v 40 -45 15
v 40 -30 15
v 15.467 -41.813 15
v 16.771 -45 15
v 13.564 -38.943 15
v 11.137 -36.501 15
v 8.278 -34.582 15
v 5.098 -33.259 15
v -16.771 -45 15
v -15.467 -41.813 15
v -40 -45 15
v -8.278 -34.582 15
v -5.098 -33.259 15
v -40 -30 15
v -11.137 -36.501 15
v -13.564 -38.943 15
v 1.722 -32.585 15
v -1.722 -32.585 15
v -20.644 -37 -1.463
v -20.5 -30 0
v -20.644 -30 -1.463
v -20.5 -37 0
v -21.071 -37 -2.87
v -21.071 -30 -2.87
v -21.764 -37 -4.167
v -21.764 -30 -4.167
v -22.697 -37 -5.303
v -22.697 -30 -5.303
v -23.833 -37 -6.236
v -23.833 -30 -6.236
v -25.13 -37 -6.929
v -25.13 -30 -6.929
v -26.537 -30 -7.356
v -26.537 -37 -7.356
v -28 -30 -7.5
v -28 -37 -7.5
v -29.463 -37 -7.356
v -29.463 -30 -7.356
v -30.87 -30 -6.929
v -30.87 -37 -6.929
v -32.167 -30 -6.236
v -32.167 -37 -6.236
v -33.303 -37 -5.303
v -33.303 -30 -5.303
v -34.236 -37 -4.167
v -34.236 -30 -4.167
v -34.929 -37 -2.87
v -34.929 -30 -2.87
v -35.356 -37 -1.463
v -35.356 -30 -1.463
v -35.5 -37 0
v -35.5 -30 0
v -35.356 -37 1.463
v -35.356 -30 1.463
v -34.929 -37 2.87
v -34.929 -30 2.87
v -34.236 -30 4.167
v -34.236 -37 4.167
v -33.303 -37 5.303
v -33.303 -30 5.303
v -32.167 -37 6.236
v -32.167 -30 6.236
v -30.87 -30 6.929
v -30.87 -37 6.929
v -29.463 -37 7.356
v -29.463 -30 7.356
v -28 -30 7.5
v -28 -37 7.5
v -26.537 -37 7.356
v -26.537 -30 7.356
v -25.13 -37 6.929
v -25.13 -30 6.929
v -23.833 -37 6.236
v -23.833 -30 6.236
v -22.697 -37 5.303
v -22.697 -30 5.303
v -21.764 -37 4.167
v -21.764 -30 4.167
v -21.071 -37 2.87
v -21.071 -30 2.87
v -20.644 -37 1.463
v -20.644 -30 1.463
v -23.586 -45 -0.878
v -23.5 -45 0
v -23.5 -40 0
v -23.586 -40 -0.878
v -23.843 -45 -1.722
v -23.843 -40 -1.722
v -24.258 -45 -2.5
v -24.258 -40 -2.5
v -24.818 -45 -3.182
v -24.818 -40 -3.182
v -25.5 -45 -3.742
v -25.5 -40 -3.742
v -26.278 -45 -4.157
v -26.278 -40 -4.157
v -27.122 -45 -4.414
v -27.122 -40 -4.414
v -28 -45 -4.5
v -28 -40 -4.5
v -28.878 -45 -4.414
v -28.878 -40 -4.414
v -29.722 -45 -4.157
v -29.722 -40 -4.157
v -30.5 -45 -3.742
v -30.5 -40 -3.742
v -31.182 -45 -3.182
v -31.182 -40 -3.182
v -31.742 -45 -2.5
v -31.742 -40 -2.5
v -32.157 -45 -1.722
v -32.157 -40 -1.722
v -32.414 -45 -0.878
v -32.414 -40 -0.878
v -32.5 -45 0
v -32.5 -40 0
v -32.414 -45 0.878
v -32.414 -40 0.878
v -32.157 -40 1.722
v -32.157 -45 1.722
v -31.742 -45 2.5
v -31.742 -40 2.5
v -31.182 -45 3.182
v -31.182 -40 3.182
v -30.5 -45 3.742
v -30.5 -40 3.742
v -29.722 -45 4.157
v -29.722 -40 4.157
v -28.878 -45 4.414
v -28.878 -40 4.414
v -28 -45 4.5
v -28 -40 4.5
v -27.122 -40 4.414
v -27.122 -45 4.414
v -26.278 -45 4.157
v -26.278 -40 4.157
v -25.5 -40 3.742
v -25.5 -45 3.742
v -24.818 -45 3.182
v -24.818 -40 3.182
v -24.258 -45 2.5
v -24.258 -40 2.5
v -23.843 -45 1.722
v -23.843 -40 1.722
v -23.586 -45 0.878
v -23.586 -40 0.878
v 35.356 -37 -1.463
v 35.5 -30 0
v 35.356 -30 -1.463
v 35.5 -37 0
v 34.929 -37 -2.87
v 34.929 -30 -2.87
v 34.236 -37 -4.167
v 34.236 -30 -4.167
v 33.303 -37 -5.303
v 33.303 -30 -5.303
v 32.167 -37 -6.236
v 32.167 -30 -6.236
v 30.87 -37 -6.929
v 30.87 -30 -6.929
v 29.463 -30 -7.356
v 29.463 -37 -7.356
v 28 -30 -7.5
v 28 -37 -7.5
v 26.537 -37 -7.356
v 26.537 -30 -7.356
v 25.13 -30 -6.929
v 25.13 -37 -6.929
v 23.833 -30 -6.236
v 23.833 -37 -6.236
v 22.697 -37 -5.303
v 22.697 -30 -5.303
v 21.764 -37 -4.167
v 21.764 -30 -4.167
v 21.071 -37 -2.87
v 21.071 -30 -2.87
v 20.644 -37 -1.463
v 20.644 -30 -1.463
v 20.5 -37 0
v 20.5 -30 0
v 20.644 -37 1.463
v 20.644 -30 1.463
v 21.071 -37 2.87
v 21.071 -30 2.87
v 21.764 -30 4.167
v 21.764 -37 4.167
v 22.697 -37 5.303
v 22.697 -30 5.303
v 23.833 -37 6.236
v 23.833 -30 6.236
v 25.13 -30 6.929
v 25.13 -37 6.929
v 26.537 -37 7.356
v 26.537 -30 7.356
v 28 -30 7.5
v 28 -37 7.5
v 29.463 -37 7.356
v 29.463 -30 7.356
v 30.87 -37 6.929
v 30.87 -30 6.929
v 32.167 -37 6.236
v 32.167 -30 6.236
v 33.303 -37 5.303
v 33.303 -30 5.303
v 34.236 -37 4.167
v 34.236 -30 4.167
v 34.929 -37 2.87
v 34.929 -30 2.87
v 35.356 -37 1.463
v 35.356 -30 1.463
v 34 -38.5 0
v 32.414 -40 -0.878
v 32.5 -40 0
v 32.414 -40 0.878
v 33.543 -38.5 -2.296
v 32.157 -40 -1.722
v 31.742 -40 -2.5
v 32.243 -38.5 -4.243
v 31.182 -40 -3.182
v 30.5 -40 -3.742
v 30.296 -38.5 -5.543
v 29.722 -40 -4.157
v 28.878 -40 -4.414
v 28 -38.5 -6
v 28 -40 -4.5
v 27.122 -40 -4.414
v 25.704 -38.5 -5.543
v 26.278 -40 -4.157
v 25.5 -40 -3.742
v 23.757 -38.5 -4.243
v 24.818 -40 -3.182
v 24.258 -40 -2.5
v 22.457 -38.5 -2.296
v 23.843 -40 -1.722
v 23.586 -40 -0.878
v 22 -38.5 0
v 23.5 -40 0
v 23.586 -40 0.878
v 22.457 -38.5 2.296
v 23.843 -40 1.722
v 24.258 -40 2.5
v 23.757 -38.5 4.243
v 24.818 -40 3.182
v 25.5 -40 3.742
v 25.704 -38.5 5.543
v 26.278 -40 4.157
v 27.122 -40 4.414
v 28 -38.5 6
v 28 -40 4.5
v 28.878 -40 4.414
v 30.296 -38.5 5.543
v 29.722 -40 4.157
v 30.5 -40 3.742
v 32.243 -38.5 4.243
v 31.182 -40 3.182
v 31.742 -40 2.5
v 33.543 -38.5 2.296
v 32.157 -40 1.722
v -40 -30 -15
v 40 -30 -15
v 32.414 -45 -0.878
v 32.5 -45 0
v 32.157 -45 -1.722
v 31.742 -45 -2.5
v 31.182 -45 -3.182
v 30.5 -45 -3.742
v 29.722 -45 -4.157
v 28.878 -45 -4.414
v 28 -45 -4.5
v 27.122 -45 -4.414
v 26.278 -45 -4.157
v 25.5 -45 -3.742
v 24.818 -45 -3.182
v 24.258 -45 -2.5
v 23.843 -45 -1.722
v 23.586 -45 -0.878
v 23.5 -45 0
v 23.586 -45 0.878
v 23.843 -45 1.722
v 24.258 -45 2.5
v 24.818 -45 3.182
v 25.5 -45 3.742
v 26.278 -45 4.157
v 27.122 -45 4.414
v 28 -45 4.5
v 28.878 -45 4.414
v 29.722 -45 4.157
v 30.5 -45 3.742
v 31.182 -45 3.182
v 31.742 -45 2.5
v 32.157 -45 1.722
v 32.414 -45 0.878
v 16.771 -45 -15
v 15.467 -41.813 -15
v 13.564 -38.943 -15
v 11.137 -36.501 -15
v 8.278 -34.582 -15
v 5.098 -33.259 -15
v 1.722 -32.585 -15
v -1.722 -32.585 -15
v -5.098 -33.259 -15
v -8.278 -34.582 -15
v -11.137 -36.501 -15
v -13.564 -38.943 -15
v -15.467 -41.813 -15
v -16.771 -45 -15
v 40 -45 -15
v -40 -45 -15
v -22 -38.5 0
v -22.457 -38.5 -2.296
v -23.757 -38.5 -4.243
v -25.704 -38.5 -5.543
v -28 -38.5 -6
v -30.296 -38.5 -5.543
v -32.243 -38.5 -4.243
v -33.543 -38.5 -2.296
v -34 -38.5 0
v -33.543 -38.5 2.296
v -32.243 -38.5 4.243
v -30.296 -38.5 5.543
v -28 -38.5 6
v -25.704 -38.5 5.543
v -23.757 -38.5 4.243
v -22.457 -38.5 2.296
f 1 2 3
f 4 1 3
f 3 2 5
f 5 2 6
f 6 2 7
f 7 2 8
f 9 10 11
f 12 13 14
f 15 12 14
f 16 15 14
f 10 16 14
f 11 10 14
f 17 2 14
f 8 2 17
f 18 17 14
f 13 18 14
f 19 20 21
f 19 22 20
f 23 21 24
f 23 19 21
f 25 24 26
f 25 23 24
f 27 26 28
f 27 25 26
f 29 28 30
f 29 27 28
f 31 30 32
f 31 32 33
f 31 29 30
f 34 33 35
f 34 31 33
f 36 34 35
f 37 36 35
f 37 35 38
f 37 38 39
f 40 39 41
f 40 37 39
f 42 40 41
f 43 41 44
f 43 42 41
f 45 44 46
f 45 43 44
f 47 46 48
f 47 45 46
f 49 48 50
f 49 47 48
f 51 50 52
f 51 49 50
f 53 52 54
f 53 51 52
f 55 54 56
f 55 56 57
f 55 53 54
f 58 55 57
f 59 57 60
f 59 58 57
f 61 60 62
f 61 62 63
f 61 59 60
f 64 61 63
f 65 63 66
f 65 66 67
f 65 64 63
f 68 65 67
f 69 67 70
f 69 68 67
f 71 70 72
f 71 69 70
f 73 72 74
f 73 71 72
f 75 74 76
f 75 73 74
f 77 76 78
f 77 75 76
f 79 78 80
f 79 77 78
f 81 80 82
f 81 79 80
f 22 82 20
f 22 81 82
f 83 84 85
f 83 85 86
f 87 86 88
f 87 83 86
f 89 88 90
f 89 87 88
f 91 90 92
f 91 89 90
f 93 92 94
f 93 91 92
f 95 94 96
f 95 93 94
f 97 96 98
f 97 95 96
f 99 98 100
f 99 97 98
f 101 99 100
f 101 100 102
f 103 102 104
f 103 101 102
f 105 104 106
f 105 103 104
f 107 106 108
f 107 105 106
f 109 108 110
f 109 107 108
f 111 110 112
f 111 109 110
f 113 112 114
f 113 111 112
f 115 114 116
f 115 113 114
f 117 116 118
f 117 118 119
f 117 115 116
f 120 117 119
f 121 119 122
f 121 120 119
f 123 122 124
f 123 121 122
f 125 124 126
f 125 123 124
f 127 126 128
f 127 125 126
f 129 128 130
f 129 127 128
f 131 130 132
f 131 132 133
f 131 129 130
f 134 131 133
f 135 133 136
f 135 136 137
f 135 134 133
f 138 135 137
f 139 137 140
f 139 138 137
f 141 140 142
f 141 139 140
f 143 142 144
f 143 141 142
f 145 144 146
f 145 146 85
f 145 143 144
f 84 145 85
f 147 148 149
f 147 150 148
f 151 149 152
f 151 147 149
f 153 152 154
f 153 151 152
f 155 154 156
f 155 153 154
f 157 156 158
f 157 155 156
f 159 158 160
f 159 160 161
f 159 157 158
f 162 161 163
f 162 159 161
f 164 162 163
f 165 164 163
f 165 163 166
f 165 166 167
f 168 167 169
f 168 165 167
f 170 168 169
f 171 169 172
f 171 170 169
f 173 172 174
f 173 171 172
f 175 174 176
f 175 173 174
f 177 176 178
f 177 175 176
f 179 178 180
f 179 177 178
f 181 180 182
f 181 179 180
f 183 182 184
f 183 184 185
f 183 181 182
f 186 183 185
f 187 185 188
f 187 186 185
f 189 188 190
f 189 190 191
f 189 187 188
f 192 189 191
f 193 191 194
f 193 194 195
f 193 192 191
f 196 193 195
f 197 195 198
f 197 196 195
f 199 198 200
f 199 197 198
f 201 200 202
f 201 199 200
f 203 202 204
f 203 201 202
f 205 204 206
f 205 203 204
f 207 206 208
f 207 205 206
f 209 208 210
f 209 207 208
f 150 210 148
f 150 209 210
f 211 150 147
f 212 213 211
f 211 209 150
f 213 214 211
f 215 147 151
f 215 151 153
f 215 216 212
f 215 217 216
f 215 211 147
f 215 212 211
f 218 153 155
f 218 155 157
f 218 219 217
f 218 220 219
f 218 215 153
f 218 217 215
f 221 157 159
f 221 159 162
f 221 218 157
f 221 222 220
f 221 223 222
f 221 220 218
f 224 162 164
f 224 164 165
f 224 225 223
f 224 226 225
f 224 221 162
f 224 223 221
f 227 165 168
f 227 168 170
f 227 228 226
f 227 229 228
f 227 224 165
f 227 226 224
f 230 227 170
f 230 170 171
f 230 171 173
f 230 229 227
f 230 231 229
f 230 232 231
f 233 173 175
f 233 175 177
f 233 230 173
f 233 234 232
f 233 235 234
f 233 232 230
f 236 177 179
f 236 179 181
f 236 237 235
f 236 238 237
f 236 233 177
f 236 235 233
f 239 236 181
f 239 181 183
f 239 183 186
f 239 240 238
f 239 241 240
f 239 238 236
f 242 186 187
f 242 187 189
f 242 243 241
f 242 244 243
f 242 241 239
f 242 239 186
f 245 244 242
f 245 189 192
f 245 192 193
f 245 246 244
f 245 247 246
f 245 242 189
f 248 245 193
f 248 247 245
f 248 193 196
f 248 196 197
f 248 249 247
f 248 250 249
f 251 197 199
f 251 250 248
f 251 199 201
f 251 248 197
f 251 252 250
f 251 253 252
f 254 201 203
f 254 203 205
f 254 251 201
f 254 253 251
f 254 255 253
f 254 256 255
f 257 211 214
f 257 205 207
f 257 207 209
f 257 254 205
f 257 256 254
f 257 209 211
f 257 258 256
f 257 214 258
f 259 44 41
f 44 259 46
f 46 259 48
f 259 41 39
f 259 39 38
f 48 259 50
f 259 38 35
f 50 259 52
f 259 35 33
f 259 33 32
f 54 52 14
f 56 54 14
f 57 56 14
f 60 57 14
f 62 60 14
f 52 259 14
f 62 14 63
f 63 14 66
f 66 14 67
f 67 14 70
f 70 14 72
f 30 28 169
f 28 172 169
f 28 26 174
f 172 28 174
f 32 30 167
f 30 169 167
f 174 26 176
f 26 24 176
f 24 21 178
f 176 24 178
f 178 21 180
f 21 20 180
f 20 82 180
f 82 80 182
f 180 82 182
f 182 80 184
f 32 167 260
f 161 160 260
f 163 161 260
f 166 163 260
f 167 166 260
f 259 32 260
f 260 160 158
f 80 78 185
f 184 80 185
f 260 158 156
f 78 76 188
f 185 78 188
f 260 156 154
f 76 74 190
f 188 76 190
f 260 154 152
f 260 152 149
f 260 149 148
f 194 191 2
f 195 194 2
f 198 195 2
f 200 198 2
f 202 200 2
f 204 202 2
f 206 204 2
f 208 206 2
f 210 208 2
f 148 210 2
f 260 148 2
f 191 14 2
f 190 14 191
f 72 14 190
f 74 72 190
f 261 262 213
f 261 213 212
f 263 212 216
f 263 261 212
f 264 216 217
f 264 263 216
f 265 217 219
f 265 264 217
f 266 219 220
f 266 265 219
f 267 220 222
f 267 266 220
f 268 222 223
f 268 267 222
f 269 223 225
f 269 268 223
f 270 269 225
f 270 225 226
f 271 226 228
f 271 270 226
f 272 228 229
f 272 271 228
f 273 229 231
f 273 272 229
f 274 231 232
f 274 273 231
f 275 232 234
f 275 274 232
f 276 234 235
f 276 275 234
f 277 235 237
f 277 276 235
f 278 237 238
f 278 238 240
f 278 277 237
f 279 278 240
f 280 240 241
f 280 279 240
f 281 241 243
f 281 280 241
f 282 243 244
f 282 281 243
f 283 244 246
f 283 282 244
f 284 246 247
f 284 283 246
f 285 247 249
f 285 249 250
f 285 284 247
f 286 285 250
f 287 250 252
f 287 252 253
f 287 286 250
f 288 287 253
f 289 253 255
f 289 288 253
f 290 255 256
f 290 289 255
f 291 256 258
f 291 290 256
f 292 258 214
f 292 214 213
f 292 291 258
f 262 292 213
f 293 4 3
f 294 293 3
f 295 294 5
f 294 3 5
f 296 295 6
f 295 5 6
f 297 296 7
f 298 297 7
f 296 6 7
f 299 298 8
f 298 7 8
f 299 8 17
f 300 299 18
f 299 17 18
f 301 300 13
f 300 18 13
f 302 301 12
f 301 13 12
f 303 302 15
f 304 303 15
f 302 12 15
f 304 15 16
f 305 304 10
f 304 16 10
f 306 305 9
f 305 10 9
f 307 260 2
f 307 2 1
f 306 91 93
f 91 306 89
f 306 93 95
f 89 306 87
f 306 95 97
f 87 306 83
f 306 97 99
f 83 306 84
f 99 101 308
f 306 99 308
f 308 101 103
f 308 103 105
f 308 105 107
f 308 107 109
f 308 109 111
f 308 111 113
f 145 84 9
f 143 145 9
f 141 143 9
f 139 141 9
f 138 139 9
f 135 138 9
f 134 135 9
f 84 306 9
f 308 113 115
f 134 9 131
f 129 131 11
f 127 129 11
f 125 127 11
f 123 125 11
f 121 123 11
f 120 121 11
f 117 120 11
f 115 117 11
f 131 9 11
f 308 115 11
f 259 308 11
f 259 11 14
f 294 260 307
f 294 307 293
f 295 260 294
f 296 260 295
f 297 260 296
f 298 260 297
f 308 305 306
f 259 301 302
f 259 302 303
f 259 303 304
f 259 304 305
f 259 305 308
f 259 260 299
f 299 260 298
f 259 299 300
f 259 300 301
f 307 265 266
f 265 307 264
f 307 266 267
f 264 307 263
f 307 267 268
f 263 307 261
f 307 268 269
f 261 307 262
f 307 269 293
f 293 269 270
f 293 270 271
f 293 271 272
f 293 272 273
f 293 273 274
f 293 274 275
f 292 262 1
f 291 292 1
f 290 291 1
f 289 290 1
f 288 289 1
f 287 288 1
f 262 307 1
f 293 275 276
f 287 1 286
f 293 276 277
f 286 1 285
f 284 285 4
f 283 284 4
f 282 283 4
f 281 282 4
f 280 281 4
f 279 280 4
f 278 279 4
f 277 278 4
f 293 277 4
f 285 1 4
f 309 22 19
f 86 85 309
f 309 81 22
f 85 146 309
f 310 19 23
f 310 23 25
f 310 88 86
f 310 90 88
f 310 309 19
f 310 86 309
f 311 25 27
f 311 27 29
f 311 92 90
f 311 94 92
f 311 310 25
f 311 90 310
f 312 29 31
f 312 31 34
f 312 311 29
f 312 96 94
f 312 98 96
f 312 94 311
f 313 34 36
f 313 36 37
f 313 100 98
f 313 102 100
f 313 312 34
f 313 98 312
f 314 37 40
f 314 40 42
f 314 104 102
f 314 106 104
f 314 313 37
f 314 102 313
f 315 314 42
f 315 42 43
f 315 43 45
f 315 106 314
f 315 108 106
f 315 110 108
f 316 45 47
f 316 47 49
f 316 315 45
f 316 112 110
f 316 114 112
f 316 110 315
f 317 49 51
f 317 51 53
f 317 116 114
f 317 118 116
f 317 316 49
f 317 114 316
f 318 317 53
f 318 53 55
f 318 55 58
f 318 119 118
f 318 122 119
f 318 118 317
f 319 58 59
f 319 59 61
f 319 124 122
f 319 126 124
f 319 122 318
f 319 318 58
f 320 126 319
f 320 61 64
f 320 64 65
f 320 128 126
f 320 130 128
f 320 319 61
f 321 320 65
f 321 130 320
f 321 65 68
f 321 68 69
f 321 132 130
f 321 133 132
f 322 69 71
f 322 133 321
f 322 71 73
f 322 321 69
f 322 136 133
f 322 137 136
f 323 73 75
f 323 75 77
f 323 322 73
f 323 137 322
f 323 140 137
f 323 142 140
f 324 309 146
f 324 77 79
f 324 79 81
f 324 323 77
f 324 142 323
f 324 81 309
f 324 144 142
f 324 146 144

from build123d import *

# Parameters (mm, degrees)
PAD007_DEPTH = 15


with BuildPart() as part:
    # Sketch007 → Pad007 (new body, symmetric)
    with BuildSketch(Plane.XY):
        with BuildLine():
            Line((-16.77051, -15), (-40, -15))
            Line((-40, -15), (-40, 0))
            Line((-40, 0), (40, 0))
            Line((40, 0), (40, -15))
            Line((40, -15), (16.77051, -15))
            ThreePointArc((16.77051, -15), (0, -2.5), (-16.77051, -15))
        make_face()
    extrude(amount=PAD007_DEPTH, both=True)

    # Sketch017 → Groove (revolve, cut)
    with BuildSketch(Plane(origin=(28, 0, 0), x_dir=(1, 0, 0), z_dir=(0, 0, 1))):
        Polygon((0, 0), (7.5, 0), (7.5, -7), (4.5, -10), (4.5, -27), (0, -27), align=None)
    revolve(axis=Axis((28, 0, 0), (0, 1, 0)), mode=Mode.SUBTRACT)

    # Sketch018 → Groove001 (revolve, cut)
    with BuildSketch(Plane(origin=(-28, 0, 0), x_dir=(1, 0, 0), z_dir=(0, 0, 1))):
        Polygon((0, 0), (7.5, 0), (7.5, -7), (4.5, -10), (4.5, -30), (0, -30), align=None)
    revolve(axis=Axis((-28, 0, 0), (0, 1, 0)), mode=Mode.SUBTRACT)


with BuildPart() as part_1:
    # Body007 placement: moved
    add(part.part.moved(Location((0, -30, 0))))


solid = part_1.part
